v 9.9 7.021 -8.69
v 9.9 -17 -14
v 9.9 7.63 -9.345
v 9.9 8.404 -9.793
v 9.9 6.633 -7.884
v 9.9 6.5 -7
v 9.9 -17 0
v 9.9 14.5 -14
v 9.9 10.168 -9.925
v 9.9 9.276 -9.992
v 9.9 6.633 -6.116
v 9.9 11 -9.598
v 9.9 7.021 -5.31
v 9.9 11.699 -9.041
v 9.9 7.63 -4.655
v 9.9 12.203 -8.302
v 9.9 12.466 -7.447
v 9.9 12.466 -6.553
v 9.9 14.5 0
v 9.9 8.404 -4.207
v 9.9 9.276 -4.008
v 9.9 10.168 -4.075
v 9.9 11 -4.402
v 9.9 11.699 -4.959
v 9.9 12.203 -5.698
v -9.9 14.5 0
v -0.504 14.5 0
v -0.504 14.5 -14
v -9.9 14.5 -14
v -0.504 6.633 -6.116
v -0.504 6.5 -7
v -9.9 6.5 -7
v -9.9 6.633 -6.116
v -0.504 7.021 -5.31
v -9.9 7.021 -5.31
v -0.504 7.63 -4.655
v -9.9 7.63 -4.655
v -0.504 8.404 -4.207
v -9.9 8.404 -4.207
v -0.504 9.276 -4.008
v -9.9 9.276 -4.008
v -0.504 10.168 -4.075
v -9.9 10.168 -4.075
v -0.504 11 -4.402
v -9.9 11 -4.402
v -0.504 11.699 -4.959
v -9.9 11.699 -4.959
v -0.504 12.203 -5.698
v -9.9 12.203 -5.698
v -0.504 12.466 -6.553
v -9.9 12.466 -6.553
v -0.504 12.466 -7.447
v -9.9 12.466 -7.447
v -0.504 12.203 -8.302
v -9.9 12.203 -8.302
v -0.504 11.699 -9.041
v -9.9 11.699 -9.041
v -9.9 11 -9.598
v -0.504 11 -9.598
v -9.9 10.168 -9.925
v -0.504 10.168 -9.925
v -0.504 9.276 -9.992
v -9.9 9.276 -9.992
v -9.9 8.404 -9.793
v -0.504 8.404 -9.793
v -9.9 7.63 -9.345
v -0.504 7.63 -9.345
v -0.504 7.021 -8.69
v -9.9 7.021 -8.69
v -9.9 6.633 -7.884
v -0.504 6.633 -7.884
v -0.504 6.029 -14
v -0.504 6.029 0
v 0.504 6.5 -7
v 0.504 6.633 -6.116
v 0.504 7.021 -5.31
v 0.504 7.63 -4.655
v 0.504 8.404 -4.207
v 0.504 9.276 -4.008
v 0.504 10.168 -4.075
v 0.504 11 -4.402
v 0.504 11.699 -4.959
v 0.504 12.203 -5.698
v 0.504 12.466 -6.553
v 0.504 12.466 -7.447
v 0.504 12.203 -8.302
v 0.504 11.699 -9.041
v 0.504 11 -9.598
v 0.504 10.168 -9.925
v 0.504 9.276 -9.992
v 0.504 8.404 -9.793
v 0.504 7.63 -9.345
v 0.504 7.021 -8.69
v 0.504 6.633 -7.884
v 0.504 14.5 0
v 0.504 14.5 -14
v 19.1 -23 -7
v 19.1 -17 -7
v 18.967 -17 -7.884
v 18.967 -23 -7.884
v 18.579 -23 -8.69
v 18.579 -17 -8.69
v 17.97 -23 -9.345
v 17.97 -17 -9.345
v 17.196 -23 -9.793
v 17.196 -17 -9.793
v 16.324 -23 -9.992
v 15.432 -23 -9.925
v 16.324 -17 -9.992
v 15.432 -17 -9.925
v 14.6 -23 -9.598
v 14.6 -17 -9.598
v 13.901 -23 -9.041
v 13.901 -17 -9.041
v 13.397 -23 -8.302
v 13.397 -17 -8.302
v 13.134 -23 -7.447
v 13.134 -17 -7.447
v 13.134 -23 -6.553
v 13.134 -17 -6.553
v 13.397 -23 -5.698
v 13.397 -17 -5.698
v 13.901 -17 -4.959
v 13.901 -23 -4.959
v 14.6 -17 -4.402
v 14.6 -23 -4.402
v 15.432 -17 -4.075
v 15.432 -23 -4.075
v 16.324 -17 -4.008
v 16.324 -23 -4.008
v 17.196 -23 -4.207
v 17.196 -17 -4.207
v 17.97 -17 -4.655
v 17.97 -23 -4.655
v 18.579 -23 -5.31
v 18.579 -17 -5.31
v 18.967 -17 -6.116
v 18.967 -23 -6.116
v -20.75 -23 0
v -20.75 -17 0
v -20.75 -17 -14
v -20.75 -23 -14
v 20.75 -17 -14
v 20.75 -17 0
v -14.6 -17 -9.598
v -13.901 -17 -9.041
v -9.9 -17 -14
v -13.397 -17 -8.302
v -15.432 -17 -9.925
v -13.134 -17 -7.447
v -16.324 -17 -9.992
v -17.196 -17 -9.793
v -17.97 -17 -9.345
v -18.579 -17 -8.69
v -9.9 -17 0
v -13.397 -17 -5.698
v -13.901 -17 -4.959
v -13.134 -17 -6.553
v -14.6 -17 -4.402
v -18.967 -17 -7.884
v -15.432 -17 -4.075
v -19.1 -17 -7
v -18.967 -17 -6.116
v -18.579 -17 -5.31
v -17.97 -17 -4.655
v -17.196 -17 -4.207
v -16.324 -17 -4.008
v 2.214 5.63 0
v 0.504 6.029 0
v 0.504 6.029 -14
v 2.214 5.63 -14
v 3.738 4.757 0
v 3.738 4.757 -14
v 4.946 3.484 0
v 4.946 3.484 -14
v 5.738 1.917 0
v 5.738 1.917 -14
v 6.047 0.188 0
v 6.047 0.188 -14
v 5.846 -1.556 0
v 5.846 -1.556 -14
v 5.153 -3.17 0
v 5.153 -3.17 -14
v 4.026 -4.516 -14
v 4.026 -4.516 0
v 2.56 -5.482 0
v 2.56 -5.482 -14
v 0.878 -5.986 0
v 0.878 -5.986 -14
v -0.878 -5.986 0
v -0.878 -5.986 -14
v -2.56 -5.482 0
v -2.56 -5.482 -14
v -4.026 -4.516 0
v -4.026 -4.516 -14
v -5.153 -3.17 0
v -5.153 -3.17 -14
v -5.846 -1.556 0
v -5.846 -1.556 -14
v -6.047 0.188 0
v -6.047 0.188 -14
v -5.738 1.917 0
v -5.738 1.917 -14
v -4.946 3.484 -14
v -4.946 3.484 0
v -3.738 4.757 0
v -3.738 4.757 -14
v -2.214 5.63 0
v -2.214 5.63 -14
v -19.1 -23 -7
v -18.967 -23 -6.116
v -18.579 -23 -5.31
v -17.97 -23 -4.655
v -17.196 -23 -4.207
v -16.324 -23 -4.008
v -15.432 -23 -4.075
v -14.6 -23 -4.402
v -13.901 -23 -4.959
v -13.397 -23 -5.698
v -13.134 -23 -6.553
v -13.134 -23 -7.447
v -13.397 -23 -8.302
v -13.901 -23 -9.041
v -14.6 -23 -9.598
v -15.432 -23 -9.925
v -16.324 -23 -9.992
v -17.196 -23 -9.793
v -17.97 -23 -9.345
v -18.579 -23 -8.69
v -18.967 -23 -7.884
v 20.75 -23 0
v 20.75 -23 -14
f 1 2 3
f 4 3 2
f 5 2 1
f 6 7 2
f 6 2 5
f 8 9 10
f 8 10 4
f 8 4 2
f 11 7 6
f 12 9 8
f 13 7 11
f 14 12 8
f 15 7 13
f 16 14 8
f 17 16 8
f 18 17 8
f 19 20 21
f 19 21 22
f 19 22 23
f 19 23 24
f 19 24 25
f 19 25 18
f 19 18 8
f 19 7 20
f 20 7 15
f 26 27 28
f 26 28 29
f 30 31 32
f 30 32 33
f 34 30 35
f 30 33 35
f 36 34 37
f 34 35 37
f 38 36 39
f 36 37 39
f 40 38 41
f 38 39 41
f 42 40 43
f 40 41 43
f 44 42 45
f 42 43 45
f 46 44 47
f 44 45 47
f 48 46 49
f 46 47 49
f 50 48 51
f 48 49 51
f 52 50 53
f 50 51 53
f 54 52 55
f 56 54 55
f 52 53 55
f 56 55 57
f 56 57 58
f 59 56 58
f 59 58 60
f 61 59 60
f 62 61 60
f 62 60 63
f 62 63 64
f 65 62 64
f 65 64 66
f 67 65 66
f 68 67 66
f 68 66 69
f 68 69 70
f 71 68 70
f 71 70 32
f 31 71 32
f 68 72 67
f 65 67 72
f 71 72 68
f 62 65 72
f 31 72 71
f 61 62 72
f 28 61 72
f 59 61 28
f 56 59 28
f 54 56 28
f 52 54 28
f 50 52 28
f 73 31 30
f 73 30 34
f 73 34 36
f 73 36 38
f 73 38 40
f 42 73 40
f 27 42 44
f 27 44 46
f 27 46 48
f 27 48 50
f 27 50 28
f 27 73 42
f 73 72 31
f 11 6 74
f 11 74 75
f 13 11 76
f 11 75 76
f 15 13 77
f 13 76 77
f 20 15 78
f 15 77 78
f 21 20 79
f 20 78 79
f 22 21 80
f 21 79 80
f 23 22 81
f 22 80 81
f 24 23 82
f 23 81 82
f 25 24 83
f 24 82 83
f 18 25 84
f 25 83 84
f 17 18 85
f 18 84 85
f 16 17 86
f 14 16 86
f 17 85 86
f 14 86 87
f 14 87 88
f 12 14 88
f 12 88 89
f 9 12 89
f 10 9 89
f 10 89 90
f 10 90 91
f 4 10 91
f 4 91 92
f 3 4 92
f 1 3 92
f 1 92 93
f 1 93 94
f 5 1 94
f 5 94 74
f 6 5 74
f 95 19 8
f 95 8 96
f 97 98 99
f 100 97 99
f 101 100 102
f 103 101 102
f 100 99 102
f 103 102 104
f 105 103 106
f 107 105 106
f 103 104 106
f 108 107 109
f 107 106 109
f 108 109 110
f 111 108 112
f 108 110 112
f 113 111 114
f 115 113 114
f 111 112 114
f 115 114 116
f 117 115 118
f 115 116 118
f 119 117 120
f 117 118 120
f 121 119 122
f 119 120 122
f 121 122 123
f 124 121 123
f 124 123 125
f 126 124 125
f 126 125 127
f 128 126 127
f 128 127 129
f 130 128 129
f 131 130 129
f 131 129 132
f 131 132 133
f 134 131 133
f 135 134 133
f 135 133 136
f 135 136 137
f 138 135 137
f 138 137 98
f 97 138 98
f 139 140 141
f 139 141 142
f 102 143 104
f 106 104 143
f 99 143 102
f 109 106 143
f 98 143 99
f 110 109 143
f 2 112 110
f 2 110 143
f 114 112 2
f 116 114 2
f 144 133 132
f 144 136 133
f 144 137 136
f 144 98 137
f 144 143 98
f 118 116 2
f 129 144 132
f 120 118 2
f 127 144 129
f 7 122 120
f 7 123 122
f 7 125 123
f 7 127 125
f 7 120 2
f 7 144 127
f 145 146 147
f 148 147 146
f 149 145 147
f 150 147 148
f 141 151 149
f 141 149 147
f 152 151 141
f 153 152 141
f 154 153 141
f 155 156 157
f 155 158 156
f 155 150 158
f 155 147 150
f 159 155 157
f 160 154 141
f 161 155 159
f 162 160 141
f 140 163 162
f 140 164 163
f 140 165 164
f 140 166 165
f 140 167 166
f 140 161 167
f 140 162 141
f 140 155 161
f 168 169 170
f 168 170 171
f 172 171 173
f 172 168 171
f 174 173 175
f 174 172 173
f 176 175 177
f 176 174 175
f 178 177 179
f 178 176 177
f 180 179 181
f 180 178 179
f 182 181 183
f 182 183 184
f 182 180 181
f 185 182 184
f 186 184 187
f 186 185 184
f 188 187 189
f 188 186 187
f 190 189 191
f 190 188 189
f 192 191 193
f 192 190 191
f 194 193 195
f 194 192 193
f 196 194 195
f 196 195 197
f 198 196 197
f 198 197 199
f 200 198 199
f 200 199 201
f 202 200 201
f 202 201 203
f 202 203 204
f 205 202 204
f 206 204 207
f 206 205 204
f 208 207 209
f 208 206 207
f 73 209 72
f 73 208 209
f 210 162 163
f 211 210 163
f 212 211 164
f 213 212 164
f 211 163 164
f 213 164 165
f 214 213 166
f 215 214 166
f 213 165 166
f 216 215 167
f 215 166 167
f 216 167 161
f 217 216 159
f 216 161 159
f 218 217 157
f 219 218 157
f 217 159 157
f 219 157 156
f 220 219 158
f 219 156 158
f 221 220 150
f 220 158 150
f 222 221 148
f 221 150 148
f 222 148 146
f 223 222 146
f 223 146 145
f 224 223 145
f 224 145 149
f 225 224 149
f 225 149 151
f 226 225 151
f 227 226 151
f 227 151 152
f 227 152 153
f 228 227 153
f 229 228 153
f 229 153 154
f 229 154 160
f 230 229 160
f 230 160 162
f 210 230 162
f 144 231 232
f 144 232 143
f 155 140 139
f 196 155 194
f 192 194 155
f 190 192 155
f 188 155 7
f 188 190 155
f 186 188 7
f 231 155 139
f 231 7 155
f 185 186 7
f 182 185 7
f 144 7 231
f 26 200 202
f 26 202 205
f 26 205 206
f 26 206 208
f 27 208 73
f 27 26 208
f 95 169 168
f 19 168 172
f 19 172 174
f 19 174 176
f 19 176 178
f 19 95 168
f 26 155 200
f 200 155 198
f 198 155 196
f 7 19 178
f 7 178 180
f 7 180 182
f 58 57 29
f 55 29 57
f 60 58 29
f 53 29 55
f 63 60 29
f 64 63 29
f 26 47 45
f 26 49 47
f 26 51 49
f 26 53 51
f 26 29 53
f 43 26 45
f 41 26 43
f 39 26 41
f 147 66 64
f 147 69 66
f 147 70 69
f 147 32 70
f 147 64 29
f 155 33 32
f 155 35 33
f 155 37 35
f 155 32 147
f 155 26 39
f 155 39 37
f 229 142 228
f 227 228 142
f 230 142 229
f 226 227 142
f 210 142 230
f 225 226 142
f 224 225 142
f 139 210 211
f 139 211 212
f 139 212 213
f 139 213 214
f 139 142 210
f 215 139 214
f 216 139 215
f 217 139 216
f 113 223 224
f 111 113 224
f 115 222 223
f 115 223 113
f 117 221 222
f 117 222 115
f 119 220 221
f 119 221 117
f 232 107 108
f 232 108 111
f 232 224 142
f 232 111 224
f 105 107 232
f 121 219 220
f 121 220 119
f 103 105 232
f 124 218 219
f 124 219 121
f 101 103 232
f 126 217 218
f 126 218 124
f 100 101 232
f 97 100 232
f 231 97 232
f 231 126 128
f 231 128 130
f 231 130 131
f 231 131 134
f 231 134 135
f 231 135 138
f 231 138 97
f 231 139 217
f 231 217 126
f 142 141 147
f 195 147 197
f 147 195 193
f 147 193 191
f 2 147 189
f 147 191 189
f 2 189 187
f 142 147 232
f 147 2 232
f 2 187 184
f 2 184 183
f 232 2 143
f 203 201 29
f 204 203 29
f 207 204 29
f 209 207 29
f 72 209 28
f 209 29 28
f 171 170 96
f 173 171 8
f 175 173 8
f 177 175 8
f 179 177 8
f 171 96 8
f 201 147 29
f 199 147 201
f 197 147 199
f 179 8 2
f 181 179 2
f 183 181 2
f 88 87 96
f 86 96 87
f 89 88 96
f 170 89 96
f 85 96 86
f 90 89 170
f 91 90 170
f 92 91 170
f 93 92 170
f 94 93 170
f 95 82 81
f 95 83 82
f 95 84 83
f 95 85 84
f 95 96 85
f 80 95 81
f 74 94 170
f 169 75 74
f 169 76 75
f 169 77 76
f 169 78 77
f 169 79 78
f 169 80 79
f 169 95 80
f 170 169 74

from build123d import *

# Parameters (mm, degrees)
Y_KSEKLIK_EKSTR_ZYON2_DEPTH = 14
IZIM3_R                     = 3
KES_EKSTR_ZYON1_DEPTH       = 30
IZIM4_R                     = 3
KES_EKSTR_ZYON2_DEPTH       = 41.234469053


with BuildPart() as part:
    # Çizim2 → Yükseklik-Ekstrüzyon2 (new body)
    with BuildSketch(Plane.XY):
        with BuildLine():
            Line((-0.504166667, 14.5), (-9.9, 14.5))
            Line((-9.9, 14.5), (-9.9, -17))
            Line((-9.9, -17), (-20.75, -17))
            Line((-20.75, -17), (-20.75, -23))
            Line((-20.75, -23), (20.75, -23))
            Line((20.75, -23), (20.75, -17))
            Line((20.75, -17), (9.9, -17))
            Line((9.9, -17), (9.9, 14.5))
            Line((9.9, 14.5), (0.504166667, 14.5))
            Line((0.504166667, 14.5), (0.504166667, 6.028956458))
            ThreePointArc((0.504166667, 6.028956458), (0, -6.05), (-0.504166667, 6.028956458))
            Line((-0.504166667, 6.028956458), (-0.504166667, 14.5))
        make_face()
    extrude(amount=-Y_KSEKLIK_EKSTR_ZYON2_DEPTH)

    # Çizim3 → Kes-Ekstrüzyon1 (cut)
    with BuildSketch(Plane.ZY.offset(9.9)):
        with Locations(Location((-7, 9.5, 0), (0, 0, 270))):
            Circle(IZIM3_R)
    extrude(amount=-KES_EKSTR_ZYON1_DEPTH, mode=Mode.SUBTRACT)

    # Çizim4 → Kes-Ekstrüzyon2 (cut, through all)
    with BuildSketch(Plane(origin=(0, -17, 0), x_dir=(1, 0, 0), z_dir=(0, 1, 0))):
        with Locations(Location((-16.1, 7, 0), (0, 0, 180))):
            Circle(IZIM4_R)
        with Locations((16.1, 7)):
            Circle(IZIM4_R)
    extrude(amount=-KES_EKSTR_ZYON2_DEPTH, mode=Mode.SUBTRACT)


solid = part.part
